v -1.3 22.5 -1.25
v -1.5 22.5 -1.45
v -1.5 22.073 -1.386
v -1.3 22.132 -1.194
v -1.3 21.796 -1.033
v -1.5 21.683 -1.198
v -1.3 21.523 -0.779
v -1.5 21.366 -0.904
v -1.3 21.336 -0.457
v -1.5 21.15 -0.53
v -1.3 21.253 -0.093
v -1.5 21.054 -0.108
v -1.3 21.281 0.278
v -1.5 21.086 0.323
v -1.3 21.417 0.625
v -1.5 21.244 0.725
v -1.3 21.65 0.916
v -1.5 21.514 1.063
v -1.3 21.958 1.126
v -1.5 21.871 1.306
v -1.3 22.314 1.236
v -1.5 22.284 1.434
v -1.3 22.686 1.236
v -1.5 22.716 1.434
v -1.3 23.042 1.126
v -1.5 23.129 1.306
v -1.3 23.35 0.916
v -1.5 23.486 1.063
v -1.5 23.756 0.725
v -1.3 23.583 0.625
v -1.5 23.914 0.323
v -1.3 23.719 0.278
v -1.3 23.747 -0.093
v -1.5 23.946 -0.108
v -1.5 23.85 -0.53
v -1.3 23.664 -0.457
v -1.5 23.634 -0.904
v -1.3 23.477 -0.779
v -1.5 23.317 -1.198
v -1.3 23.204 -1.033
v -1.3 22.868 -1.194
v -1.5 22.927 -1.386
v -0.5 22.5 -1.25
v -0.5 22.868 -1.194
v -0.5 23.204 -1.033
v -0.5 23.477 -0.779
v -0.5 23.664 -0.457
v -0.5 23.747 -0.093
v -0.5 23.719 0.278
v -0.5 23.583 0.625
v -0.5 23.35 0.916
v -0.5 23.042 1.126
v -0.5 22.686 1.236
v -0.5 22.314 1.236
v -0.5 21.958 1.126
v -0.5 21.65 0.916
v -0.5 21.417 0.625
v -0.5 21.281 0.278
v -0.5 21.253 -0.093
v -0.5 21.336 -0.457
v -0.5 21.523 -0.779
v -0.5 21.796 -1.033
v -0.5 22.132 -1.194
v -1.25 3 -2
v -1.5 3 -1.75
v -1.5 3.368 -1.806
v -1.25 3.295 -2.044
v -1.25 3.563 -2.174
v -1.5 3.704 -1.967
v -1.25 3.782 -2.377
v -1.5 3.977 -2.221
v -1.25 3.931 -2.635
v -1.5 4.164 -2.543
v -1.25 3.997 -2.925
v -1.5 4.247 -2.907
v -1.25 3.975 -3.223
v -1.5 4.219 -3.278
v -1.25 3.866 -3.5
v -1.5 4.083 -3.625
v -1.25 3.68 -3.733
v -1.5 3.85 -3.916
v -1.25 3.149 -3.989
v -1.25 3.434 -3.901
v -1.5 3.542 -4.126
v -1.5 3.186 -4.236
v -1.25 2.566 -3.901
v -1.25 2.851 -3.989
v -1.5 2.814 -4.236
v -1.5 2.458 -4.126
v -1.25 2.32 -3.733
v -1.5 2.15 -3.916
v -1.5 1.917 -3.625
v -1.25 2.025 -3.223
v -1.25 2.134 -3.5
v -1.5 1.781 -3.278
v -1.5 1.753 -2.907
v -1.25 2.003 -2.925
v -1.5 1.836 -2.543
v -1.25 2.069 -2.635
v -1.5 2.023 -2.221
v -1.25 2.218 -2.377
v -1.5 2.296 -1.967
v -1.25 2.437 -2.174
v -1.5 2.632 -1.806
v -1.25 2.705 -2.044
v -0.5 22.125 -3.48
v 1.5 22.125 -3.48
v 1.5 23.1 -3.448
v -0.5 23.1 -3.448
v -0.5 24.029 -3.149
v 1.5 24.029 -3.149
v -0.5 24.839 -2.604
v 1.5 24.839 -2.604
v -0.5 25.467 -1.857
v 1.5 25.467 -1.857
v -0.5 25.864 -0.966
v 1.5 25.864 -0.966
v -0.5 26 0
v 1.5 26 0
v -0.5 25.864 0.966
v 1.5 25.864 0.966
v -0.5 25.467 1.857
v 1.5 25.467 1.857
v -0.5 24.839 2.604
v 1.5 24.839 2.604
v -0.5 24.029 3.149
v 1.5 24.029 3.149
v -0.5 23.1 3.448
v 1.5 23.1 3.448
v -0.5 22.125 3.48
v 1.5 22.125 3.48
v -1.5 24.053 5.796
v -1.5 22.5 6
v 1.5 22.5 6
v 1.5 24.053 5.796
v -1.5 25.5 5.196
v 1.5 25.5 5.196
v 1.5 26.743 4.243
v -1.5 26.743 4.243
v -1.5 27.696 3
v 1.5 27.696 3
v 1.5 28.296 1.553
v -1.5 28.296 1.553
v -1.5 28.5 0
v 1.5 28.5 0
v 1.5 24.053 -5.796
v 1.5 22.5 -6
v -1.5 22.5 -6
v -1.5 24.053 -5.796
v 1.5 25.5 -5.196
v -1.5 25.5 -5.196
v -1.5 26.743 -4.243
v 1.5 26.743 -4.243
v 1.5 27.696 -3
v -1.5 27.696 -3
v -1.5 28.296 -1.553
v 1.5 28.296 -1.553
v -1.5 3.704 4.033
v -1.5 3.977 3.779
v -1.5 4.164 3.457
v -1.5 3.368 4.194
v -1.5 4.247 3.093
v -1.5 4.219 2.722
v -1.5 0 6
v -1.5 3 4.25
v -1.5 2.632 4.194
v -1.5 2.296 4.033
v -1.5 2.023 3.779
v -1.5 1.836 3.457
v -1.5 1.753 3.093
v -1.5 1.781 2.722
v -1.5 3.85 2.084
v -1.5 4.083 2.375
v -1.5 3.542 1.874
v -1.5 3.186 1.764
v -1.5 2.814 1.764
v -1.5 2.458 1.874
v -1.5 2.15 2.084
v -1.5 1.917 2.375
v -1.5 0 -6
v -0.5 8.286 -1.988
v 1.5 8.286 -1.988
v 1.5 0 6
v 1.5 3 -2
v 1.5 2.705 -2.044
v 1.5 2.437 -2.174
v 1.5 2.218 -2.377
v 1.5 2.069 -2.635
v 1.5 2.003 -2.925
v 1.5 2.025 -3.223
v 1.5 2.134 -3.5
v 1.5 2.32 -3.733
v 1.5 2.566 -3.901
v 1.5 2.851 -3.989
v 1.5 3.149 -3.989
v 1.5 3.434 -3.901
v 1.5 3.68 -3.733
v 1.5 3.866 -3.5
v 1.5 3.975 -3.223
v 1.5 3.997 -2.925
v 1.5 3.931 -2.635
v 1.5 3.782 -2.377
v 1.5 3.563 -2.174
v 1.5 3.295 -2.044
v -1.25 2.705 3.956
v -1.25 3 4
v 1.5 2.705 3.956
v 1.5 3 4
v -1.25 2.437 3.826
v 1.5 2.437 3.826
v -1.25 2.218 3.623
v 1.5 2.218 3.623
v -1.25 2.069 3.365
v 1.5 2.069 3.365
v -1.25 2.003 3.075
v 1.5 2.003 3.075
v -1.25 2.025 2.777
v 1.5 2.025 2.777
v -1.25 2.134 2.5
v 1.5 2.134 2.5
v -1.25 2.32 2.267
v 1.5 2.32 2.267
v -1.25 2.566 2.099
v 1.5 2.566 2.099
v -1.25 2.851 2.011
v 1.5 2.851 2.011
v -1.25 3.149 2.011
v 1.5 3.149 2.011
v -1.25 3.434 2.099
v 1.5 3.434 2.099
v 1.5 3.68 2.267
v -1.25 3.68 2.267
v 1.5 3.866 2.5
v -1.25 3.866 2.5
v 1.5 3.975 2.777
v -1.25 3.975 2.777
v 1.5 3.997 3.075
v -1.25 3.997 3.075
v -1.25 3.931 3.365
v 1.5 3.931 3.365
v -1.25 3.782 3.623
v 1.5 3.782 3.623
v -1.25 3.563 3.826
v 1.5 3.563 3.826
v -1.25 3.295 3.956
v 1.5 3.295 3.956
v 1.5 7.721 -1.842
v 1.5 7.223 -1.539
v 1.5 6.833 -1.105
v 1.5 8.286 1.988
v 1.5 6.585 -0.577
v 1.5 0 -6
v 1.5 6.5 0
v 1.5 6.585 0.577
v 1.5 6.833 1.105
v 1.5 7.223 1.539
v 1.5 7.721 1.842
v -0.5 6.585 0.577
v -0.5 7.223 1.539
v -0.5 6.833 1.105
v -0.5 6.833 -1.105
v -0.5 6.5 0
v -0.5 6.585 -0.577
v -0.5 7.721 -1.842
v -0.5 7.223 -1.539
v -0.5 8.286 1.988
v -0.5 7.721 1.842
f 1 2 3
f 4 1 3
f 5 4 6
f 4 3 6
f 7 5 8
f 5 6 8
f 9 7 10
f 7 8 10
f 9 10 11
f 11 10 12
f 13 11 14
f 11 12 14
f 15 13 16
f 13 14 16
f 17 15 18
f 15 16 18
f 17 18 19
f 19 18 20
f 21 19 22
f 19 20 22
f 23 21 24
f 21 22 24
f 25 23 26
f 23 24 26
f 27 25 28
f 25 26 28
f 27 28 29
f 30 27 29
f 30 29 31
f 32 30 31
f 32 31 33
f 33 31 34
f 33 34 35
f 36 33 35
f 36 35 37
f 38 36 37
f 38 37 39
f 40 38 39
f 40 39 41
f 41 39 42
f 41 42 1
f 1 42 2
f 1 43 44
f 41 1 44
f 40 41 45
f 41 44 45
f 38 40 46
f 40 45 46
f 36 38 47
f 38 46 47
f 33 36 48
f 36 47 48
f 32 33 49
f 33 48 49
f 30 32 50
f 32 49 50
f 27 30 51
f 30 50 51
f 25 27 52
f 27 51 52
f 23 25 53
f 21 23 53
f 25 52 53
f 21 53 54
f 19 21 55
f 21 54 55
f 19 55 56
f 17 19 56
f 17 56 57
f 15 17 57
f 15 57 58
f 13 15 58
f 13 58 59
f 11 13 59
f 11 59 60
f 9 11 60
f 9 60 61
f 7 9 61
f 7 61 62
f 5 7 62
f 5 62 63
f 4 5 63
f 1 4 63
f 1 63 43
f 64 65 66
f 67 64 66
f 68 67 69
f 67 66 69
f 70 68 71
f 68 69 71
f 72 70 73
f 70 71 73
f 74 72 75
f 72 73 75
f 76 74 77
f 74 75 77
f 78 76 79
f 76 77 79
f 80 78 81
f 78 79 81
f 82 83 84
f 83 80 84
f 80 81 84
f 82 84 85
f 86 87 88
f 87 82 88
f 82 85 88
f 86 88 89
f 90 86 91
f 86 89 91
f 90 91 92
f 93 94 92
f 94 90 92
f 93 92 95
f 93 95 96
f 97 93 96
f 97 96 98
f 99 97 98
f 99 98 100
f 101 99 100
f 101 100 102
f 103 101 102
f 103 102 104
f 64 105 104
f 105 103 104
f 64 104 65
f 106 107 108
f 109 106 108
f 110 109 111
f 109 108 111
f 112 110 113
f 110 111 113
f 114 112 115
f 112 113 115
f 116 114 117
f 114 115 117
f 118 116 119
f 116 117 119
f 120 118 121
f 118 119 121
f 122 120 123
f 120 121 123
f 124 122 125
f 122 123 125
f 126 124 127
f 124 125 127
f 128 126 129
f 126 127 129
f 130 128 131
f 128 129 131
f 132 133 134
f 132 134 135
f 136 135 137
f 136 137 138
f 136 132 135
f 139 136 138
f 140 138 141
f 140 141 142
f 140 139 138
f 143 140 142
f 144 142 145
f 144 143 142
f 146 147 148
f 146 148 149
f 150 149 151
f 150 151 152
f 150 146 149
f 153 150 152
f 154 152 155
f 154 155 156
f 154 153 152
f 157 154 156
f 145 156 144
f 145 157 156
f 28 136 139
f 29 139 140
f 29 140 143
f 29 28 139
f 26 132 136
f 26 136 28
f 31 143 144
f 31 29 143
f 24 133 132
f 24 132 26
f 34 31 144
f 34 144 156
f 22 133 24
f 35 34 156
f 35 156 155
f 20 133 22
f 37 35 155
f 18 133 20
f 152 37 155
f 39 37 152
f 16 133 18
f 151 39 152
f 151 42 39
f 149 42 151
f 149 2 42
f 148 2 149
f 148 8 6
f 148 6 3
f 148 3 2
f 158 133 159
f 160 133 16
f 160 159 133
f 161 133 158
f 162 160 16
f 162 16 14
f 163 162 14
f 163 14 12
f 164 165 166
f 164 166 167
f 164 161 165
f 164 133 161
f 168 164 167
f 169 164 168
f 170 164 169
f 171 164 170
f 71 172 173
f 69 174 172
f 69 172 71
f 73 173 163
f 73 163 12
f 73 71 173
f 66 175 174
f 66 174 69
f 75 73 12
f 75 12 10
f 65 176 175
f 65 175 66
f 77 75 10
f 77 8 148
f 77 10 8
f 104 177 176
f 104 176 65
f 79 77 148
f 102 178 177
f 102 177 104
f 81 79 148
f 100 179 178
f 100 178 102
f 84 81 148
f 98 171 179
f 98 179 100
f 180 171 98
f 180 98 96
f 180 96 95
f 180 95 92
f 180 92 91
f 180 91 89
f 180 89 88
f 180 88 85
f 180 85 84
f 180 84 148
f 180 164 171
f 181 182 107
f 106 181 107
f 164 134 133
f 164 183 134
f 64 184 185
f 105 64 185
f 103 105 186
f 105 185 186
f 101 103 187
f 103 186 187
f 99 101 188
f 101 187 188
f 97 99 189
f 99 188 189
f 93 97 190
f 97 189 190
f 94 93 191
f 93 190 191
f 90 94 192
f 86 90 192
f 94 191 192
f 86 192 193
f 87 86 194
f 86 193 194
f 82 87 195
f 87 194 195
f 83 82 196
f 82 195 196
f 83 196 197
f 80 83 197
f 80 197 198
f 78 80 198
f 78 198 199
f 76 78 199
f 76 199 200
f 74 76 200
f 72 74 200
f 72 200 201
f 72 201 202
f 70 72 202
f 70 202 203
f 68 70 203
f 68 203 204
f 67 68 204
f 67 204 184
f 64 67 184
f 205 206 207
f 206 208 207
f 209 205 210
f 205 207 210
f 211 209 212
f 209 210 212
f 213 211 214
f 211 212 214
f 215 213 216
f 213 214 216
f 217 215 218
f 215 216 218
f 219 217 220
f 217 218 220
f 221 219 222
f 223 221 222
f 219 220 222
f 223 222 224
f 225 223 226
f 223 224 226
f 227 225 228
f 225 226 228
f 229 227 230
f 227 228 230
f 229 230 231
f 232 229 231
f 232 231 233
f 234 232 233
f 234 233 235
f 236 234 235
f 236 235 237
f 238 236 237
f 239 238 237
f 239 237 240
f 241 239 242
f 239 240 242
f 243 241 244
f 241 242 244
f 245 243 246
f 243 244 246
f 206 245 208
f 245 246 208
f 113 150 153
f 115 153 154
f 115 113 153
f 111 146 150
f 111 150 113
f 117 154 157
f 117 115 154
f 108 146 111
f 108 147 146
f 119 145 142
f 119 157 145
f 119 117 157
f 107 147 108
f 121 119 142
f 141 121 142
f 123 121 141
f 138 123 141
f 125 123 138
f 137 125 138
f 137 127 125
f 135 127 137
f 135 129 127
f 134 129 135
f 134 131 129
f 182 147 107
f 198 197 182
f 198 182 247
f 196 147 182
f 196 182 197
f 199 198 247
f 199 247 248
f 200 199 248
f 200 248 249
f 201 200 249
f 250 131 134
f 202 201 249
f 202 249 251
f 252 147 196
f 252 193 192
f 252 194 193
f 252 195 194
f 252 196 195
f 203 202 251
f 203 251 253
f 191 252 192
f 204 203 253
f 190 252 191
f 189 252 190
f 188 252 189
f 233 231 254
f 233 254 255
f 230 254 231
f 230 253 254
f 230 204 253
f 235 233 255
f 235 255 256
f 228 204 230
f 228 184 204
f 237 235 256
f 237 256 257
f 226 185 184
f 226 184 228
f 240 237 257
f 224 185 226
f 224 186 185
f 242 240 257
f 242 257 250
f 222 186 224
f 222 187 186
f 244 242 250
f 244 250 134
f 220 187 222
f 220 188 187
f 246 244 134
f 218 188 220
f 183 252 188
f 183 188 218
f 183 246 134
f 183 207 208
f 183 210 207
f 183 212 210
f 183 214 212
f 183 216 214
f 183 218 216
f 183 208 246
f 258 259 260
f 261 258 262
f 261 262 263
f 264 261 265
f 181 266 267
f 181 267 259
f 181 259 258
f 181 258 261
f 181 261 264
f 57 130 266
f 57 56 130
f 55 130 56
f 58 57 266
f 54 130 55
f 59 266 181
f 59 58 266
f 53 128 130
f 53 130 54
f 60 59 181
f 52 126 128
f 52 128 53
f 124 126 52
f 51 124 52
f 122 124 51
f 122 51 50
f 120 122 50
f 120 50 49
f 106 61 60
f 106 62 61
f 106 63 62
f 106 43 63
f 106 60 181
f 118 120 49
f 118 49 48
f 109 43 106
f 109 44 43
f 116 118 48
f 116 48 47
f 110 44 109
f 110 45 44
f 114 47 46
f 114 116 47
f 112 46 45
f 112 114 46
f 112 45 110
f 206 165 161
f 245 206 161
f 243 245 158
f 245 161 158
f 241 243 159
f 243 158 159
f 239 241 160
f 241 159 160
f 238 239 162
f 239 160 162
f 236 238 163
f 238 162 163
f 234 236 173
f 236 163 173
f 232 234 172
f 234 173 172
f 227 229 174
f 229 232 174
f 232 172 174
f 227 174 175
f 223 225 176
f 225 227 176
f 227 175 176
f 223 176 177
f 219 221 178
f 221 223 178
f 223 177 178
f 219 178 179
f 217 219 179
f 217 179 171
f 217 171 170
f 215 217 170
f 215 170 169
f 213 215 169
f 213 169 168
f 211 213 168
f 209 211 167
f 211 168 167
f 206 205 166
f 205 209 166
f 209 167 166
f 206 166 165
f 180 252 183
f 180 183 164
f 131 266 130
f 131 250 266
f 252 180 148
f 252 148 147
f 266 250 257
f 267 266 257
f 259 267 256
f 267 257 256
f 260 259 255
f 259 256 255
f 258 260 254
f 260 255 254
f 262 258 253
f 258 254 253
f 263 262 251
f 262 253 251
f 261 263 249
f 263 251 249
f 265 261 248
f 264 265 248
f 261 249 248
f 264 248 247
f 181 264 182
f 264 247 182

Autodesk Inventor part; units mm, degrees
ref_plane "YZ Plane" through (0, 0, 0) normal (1, 0, 0) x (0, 1, 0)
ref_plane "XZ Plane" through (0, 0, 0) normal (0, 1, 0) x (-1, 0, 0)
ref_plane "XY Plane" through (0, 0, 0) normal (0, 0, 1) x (1, 0, 0)
sketch "Sketch1" plane through (0, 0, 0) normal (0, 1, 0) x (-1, 0, 0)
  line L0 (-1.5, 6) -> (1.5, 6)
  line L1 (1.5, 6) -> (1.5, -6)
  line L2 (1.5, -6) -> (-1.5, -6)
  line L3 (-1.5, -6) -> (-1.5, 6)
  line L4 (-1.5, 6) -> (1.5, -6) construction
  line L5 (1.5, 6) -> (-1.5, -6) construction
  point P0 (0, 0)
  dimension "d0" = 3
  dimension "d1" = 12
extrude "Extrusion1" add sketch "Sketch1" along normal blind 28.5
fillet "Fillet1" radius 6 2 edges at (0, 28.5, 6) (0, 28.5, -6)
sketch "Sketch3" plane through (1.5, 0, 6) normal (1, 0, 0) x (0, 0, -1)
  arc A0 (12, 22.5) -> (0, 22.5) centre (6, 22.5) ccw projected
  arc A1 (9.4799, 22.125) -> (2.5201, 22.125) centre (6, 22.5) ccw
  line L0 (6, 22.5) -> (6, 8.5) construction
  line L1 (6, 22.5) -> (20, 22.5) construction
  arc A2 (4.0115, 8.2857) -> (7.9885, 8.2857) centre (6, 8.5) ccw
  line L2 (4.0115, 8.2857) -> (2.5201, 22.125)
  line L3 (7.9885, 8.2857) -> (9.4799, 22.125)
  circle A3 centre (6, 22.5) radius 1.25
  point P0 (6, 0)
  dimension "d8" = 7
  dimension "d9" = 14
  dimension "d10" = 90
  dimension "d11" = 4
  dimension "d43" = 2.5
extrude "Extrusion3" cut sketch "Sketch3" against normal blind 2
sketch "Sketch6" plane through (-1.5, 0, -6) normal (-1, 0, 0) x (0, 0, 1)
  line L0 (6, 0) -> (6, 28.5)
  arc A0 (12, 22.5) -> (0, 22.5) centre (6, 22.5) ccw projected
  line L1 (0, 0) -> (12, 0) construction
  line L2 (0, 0) -> (3, 0) construction
  line L3 (3, 0) -> (3, 3) construction
  line L4 (3, 3) -> (0, 3) construction
  line L5 (0, 3) -> (0, 0) construction
  line L6 (9, 0) -> (9, 3) construction
  line L7 (9, 3) -> (12, 3) construction
  dimension "d35" = 3
hole "Hole2" at (-1.5, 3, -3) at (-1.5, 3, 3) direction (1, 0, 0) diameter 2 depth 3 countersink diameter 2.5 countersink angle 90
extrude "Vysunutí6" cut sketch "Sketch3" against normal through all contours A3
chamfer "Chamfer1" distance 0.2 angle 45 1 edges at (-1.5, 22.5, 1.25)
properties part number "middleLegv2-2_3DPrint"
